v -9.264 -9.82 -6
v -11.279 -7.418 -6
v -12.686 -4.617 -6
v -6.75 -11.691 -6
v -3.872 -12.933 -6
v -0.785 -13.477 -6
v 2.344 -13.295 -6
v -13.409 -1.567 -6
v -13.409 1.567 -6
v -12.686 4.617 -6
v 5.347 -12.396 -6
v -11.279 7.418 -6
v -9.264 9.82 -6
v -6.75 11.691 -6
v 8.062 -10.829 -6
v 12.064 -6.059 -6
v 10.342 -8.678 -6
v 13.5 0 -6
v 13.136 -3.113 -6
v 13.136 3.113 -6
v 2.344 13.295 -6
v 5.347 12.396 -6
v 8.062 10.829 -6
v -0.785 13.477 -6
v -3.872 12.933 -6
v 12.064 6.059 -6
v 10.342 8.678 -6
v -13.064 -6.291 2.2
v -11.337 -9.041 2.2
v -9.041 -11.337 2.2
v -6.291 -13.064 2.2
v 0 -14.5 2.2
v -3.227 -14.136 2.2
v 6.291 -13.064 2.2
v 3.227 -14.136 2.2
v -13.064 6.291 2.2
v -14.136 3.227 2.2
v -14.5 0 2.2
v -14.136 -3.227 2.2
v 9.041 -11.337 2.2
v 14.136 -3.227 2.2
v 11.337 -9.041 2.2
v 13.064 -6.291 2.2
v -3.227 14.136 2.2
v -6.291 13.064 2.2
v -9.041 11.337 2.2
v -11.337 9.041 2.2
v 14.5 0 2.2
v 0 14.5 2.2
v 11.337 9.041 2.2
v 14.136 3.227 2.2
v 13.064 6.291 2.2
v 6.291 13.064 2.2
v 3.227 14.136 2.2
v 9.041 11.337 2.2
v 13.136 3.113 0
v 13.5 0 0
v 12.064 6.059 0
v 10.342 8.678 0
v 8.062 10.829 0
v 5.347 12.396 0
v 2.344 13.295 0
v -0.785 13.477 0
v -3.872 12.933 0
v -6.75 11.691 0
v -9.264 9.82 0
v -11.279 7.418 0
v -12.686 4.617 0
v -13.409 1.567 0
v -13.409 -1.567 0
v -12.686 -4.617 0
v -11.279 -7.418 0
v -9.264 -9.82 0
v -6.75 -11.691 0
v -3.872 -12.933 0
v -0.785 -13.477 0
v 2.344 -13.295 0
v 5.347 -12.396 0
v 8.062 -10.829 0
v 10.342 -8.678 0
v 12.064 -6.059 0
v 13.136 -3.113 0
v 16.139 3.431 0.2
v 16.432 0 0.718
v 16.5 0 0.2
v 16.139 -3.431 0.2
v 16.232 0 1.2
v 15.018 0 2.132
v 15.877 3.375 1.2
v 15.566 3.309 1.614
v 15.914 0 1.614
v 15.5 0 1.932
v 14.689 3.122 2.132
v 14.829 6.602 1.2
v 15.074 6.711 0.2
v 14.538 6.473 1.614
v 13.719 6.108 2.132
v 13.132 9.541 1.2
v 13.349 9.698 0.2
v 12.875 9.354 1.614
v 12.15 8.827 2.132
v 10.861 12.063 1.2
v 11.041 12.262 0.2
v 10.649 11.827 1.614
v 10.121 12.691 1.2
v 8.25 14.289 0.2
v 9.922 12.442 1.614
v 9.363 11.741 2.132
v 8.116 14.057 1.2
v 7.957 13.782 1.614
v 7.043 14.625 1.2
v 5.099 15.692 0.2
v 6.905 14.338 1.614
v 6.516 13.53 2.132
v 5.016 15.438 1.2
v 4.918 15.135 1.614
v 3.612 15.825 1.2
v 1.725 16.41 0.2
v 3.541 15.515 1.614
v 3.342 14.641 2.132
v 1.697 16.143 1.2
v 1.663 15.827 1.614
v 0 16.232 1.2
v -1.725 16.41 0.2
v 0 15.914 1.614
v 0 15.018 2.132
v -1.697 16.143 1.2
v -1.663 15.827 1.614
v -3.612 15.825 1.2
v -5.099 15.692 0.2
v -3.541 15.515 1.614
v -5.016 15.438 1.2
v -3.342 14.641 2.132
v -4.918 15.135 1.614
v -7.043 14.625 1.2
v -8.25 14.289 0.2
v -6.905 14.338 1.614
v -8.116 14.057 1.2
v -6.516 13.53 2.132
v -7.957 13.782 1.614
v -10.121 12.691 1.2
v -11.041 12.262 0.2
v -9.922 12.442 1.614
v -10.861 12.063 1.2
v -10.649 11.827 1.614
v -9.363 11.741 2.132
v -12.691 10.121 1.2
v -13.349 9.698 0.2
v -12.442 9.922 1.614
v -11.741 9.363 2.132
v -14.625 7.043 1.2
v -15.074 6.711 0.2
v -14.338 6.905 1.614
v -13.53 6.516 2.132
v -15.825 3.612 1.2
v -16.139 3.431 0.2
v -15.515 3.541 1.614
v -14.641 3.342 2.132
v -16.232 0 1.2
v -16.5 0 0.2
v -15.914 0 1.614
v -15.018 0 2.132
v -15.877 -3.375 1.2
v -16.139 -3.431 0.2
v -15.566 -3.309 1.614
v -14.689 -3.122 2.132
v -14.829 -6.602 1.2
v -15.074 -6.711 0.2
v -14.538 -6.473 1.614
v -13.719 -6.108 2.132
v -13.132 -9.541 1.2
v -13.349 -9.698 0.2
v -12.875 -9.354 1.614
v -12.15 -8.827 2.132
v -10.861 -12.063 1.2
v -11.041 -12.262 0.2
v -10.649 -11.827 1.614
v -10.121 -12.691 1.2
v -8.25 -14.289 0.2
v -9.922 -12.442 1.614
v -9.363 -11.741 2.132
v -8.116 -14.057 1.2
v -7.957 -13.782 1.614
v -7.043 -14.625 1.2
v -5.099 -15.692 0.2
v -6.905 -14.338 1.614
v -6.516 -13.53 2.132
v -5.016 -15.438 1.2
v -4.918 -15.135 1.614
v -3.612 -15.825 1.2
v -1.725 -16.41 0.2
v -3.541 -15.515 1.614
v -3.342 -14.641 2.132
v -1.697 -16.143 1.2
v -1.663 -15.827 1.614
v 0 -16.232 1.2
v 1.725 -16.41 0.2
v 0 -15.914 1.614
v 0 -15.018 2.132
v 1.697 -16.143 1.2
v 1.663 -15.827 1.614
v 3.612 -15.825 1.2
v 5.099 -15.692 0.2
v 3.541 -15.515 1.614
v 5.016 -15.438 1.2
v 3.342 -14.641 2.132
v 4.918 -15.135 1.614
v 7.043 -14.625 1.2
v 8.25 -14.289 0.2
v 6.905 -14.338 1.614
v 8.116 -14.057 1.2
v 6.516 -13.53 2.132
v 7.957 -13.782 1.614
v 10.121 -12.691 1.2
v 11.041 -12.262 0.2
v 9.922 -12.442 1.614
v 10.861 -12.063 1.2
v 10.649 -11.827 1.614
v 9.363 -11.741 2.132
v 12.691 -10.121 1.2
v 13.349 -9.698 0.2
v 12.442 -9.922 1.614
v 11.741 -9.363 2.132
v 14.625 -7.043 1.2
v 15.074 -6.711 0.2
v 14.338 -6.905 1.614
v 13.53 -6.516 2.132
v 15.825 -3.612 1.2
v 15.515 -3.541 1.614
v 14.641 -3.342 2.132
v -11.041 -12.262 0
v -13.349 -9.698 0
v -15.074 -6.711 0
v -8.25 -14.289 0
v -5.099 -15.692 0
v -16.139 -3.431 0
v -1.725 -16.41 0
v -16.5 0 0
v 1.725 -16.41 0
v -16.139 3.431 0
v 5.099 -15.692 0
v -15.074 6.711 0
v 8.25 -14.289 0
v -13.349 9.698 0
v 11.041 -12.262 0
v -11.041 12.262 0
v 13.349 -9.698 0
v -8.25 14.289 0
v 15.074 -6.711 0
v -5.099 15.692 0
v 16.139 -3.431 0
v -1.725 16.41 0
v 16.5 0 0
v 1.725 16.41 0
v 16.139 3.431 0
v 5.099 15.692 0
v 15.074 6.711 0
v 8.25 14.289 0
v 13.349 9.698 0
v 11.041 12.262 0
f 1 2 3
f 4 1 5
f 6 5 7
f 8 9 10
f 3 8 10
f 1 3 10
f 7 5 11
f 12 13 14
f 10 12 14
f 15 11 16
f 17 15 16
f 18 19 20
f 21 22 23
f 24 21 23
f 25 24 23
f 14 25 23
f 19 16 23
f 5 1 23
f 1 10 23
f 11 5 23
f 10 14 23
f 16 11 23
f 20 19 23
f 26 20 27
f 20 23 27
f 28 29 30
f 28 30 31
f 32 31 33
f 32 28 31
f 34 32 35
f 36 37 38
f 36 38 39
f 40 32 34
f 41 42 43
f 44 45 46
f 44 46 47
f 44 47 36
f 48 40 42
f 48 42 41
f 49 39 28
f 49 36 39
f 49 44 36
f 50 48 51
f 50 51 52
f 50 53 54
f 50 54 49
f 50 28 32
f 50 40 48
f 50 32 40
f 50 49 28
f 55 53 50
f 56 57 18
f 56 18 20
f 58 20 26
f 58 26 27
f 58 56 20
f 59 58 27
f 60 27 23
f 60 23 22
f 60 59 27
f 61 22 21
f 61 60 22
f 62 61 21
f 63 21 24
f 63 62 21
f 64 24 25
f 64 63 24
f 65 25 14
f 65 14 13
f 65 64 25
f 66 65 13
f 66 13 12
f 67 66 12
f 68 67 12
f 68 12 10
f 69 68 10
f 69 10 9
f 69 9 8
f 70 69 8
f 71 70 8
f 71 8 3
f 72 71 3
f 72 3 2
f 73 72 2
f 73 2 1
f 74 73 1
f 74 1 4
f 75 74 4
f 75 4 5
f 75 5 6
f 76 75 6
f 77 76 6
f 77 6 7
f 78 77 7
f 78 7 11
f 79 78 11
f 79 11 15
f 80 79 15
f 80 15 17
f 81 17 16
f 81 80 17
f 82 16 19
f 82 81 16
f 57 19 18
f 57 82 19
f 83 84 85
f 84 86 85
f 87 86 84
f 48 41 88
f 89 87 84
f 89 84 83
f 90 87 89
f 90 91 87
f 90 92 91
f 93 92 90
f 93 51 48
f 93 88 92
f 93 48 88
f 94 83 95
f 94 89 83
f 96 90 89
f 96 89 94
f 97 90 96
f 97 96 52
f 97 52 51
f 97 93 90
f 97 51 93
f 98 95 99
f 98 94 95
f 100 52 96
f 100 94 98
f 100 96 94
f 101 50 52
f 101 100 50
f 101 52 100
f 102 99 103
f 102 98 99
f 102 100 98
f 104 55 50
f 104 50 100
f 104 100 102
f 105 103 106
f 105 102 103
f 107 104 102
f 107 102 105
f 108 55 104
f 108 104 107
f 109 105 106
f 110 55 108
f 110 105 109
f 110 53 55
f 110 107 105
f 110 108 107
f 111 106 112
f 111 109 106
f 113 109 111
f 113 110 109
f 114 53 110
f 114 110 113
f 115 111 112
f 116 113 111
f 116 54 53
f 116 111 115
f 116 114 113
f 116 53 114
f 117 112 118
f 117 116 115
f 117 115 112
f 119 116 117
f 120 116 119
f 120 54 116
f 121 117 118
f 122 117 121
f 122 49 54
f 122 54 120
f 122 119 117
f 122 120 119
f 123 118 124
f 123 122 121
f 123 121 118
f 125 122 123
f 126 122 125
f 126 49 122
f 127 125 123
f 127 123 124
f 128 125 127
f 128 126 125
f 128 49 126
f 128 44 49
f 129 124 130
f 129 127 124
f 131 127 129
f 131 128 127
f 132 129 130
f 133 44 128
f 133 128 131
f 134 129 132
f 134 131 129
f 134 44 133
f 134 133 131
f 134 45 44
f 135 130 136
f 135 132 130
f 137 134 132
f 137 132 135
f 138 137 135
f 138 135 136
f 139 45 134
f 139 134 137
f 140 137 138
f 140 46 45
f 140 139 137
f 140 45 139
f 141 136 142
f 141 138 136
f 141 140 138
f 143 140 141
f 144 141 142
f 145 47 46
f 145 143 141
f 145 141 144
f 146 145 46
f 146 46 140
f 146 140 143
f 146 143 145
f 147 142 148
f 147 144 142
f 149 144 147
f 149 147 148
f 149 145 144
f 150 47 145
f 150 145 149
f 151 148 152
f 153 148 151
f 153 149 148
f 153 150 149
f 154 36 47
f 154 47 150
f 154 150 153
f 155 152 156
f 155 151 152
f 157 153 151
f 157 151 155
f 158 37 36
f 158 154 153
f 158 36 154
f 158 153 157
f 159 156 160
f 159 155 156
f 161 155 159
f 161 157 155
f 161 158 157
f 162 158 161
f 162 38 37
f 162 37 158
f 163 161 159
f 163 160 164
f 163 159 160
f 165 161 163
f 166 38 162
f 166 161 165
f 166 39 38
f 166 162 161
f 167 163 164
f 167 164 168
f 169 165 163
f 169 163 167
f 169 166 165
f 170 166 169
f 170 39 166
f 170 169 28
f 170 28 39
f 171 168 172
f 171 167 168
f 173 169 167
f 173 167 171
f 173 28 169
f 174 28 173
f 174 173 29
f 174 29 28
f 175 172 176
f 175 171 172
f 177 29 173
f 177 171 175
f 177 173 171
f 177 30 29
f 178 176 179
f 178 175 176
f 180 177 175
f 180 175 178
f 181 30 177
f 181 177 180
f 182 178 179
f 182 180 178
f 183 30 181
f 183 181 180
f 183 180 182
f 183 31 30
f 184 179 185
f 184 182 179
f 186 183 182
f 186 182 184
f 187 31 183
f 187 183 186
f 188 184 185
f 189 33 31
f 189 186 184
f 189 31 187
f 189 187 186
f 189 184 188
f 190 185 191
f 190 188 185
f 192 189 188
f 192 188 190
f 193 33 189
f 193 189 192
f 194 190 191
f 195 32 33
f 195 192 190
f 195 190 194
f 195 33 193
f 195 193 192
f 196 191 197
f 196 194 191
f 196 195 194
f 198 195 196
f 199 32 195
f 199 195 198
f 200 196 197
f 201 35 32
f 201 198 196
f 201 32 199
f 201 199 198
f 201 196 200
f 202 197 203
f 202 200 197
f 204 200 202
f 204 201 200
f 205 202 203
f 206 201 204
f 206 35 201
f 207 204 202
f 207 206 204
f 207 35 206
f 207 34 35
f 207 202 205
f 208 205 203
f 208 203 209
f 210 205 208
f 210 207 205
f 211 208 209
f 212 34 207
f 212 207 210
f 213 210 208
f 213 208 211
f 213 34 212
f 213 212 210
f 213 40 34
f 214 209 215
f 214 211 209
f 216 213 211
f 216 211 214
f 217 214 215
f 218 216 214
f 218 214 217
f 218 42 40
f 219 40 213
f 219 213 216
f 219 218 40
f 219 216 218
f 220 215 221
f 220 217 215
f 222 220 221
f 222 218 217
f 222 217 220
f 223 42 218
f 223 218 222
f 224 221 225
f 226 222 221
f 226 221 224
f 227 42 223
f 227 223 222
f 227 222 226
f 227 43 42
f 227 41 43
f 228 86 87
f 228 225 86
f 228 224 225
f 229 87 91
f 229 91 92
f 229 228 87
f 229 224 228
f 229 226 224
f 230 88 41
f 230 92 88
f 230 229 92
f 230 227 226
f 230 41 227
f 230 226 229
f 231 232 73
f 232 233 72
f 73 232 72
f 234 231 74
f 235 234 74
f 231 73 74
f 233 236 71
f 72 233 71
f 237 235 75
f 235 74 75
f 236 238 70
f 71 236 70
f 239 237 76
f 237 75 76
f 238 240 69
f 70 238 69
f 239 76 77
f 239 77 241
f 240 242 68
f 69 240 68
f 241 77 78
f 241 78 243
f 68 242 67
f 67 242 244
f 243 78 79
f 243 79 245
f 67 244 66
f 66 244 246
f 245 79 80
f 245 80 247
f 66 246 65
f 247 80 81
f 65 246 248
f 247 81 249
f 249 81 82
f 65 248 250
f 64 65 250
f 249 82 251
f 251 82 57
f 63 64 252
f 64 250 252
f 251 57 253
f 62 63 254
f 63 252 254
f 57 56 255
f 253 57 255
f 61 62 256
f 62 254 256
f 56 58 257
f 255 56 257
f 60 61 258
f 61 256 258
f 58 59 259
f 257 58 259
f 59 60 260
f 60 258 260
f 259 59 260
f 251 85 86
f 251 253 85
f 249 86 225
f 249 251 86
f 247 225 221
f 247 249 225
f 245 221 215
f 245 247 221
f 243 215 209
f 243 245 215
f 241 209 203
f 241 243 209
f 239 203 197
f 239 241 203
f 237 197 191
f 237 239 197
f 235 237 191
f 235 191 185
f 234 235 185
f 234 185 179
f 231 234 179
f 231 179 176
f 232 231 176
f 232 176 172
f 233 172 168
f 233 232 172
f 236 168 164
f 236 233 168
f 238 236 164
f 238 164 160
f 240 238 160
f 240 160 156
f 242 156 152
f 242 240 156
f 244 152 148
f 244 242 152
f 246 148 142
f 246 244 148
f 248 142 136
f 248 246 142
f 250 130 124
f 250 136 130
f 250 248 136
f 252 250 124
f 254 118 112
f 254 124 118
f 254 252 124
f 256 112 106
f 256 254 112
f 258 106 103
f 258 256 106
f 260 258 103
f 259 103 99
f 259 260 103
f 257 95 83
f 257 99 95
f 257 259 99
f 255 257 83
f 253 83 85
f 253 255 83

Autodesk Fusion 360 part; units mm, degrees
sketch "Sketch1" plane through (0, 0, 0) normal (0, 0, 1) x (1, 0, 0)
  circle A0 centre (0, 0) radius 13.5
  circle A1 centre (0, 0) radius 16.5
  dimension "d1" = 27
  dimension "d2" = 33
extrude "Extrude1" add sketch "Sketch1" along normal blind 2.2 contours A0 | A1
extrude "Extrude2" add sketch "Sketch1" against normal blind 6 contours A0
fillet "Fillet1" radius 2 1 edges at (-15.3834, -5.9667, 2.2)
